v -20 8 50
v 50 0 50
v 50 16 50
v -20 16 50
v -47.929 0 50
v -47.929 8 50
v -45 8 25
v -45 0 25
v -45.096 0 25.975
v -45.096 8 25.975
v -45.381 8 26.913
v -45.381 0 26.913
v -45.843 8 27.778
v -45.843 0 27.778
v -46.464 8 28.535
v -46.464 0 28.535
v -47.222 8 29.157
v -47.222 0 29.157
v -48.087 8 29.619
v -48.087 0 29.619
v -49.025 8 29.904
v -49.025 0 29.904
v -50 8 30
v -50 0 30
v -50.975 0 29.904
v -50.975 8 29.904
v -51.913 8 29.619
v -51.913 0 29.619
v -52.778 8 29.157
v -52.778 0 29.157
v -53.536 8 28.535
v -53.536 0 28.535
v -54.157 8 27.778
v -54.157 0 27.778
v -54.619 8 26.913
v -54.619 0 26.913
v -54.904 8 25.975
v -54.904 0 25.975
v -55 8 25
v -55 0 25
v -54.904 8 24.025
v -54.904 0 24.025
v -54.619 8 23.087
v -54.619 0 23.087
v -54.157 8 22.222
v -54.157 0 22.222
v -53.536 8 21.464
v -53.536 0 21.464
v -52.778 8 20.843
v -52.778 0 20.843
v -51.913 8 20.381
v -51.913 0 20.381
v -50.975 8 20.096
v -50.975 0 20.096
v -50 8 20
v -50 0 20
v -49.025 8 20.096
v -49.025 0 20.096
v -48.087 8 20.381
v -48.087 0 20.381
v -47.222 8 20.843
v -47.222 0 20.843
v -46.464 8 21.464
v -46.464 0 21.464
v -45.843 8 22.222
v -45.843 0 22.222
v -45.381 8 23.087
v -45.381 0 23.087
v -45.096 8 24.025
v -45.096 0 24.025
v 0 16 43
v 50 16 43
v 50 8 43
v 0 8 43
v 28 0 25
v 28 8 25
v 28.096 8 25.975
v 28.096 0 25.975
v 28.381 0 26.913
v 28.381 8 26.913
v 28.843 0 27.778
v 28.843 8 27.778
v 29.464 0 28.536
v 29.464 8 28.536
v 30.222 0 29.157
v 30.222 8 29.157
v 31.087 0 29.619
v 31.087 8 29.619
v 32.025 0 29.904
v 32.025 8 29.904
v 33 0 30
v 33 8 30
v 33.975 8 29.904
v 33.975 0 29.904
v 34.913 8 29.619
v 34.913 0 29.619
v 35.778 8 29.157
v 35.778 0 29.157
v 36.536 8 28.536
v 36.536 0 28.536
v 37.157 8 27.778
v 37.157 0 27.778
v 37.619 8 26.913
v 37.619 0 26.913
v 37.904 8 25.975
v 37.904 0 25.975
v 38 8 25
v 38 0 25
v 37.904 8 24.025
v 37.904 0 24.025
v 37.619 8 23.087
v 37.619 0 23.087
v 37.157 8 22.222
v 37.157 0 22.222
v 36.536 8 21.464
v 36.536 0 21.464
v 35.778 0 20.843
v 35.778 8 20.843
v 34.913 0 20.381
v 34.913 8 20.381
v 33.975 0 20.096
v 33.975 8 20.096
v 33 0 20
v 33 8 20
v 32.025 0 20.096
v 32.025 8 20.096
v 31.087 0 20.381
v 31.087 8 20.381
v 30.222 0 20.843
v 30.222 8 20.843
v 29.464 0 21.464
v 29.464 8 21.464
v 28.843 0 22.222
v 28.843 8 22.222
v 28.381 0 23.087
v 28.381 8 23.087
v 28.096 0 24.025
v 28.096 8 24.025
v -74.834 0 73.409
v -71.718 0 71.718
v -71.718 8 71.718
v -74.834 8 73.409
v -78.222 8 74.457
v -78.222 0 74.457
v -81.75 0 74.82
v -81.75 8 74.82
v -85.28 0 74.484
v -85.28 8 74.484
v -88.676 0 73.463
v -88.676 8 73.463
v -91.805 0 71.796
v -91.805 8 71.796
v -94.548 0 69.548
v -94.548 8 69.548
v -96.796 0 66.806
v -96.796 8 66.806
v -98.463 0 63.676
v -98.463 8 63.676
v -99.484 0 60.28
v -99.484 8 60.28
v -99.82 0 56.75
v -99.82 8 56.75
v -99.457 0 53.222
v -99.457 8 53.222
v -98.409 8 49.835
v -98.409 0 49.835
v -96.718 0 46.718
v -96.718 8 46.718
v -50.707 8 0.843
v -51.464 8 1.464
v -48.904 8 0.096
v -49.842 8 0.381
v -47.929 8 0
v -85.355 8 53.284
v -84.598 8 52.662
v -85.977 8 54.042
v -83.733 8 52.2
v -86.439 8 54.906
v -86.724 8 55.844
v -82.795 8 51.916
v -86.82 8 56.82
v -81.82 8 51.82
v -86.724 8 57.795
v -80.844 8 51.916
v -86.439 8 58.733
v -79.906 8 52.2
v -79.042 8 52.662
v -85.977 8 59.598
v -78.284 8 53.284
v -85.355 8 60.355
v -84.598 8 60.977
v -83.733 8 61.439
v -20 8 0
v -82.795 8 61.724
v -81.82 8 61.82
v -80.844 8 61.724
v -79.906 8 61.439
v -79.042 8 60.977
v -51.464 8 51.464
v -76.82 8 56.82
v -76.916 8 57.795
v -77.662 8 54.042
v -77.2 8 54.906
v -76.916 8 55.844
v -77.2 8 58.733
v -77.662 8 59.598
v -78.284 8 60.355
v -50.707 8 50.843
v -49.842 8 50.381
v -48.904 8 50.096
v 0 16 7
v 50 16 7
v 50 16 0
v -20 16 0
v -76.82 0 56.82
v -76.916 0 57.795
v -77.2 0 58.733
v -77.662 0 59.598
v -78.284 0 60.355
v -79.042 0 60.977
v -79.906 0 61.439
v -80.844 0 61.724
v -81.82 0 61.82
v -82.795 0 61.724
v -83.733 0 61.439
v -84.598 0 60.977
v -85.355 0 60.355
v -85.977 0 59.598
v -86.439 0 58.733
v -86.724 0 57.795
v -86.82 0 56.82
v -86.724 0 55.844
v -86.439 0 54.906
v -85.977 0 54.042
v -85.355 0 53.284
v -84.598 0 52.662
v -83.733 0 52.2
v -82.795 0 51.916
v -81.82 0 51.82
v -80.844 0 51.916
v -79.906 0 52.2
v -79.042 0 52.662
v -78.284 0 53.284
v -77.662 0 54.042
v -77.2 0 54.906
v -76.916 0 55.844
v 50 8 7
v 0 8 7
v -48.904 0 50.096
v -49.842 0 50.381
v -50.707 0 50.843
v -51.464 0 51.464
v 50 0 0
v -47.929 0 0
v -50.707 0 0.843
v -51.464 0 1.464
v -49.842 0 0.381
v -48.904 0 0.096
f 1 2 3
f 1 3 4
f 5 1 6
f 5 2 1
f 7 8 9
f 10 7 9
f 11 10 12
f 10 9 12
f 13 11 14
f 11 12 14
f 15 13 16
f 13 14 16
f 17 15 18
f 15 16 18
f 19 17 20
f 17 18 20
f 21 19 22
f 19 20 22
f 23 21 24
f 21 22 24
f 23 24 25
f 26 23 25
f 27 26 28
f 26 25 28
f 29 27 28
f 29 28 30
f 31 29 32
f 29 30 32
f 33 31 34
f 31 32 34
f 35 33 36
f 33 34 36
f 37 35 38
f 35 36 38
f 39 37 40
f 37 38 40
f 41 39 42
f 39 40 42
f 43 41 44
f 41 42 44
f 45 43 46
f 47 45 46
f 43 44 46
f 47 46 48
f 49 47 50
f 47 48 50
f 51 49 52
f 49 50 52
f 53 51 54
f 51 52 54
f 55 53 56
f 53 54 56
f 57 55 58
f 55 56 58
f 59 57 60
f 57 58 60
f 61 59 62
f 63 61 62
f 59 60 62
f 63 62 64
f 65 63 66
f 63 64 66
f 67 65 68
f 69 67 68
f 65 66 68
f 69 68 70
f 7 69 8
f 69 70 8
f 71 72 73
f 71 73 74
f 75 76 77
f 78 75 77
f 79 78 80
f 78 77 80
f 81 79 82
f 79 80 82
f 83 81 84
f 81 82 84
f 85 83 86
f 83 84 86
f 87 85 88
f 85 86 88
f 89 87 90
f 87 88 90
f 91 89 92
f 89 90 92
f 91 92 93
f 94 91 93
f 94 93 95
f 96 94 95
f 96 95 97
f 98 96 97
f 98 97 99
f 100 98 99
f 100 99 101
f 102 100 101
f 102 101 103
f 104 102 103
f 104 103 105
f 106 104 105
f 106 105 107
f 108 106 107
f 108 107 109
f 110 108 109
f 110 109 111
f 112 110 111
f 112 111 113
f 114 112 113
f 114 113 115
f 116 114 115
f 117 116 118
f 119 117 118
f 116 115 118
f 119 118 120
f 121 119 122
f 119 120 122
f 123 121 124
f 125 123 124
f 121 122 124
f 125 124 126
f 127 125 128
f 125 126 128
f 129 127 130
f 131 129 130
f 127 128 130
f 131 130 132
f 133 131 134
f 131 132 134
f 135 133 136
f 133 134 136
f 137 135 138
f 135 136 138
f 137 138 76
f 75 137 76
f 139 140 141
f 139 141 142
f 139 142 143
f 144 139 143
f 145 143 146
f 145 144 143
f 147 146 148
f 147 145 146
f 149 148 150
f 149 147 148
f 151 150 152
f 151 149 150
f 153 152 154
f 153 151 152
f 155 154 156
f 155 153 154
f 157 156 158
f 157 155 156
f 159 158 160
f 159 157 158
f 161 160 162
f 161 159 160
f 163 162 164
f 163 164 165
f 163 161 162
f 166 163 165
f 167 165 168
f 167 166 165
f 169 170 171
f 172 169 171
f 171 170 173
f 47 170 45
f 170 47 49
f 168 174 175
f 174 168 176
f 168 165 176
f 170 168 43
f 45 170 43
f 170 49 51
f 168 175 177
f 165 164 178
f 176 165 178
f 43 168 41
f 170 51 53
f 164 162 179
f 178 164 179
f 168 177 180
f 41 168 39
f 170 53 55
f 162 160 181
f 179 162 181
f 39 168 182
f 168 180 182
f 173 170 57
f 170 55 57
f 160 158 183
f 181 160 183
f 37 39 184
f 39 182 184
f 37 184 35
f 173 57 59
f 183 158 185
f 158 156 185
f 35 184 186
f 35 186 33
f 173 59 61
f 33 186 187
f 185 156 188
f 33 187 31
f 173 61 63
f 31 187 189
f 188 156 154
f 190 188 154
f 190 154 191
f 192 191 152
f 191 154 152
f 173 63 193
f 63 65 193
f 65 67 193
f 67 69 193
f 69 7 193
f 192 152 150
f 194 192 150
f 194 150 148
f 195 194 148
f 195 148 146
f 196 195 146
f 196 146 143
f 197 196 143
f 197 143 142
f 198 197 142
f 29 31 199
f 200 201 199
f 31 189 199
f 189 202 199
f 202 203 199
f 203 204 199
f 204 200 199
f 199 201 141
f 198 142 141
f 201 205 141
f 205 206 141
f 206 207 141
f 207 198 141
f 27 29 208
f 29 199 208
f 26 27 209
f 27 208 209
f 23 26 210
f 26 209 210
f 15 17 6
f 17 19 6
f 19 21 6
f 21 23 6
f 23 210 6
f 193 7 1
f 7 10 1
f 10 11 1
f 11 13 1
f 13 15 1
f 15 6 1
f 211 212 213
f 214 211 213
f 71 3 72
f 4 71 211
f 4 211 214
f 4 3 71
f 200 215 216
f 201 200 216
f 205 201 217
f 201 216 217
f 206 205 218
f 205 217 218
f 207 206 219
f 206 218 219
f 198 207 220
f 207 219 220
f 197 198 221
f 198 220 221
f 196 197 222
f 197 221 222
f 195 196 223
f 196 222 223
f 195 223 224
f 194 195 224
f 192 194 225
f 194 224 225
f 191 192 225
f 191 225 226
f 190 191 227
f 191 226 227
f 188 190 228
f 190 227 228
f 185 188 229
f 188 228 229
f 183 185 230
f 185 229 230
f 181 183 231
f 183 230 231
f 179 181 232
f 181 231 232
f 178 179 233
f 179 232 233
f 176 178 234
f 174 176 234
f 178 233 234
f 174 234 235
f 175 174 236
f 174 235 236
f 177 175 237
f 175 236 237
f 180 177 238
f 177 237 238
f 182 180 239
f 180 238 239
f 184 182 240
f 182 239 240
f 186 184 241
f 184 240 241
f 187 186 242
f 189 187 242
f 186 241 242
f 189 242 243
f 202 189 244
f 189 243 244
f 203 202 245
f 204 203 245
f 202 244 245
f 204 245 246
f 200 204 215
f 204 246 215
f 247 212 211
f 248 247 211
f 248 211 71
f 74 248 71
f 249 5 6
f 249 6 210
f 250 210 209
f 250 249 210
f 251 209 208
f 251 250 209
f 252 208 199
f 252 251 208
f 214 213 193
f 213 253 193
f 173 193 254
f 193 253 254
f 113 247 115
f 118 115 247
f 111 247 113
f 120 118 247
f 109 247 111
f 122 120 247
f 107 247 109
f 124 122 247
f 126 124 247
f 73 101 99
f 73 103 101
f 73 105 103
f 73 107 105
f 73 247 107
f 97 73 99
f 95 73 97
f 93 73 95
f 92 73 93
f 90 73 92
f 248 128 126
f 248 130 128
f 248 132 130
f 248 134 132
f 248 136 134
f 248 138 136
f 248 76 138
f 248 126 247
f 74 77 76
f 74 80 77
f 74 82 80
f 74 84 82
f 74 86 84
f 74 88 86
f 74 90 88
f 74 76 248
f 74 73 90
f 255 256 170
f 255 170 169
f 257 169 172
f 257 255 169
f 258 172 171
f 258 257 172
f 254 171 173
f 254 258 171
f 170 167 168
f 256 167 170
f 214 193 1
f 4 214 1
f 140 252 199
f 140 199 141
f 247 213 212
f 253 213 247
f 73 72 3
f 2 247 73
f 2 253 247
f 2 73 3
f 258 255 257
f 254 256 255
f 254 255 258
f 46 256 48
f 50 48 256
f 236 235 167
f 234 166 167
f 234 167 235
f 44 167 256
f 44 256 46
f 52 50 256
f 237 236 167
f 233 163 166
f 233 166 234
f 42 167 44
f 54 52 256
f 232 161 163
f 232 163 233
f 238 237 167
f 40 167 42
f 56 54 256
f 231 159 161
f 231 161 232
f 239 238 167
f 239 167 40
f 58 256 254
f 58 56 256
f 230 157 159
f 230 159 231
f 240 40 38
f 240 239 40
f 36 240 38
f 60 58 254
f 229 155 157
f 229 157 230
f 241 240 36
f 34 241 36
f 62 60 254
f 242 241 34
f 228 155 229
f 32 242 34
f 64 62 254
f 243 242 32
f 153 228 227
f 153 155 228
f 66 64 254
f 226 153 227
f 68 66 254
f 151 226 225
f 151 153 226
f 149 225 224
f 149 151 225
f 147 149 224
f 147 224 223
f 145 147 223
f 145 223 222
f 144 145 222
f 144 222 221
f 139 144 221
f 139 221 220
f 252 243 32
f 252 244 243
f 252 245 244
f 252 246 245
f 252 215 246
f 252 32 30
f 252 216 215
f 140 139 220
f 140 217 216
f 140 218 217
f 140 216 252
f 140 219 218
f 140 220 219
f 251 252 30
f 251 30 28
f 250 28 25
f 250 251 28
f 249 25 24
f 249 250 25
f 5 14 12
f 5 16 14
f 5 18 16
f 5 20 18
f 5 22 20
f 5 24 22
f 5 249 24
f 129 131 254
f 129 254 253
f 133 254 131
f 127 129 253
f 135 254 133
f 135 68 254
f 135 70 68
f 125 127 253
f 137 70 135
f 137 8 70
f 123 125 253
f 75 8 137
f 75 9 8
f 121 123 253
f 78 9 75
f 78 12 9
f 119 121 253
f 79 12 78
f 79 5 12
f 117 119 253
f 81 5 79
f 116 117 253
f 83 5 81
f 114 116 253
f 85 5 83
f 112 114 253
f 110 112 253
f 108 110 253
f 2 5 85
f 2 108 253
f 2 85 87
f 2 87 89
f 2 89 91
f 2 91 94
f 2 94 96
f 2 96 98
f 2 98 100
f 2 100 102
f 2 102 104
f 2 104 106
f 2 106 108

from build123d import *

# Parameters (mm, degrees)
F0_R     = 5
F1_DEPTH = 8
F2_W     = 70
F2_H     = 50
F3_DEPTH = 8
F4_W     = 50
F4_H     = 36
F5_DEPTH = 8
F6_R     = 5
F7_DEPTH = 25


with BuildPart() as f1:
    # F0 (on Front) → F1 (new body)
    with BuildSketch(Plane.XZ):
        with BuildLine():
            ThreePointArc((-51.464466, 1.464466), (-49.842349, 0.380602), (-47.928932, 0))
            Line((-47.928932, 0), (50, 0))
            Line((50, 0), (50, 50))
            Line((50, 50), (-47.928932, 50))
            ThreePointArc((-47.928932, 50), (-49.842349, 50.380602), (-51.464466, 51.464466))
            Line((-51.464466, 51.464466), (-71.717587, 71.717587))
            ThreePointArc((-71.717587, 71.717587), (-94.547613, 69.547798), (-96.717812, 46.717812))
            Line((-96.717812, 46.717812), (-51.464466, 1.464466))
        make_face()
        with Locations((-50, 24.999957)):
            Circle(F0_R, mode=Mode.SUBTRACT)
        with Locations((-81.819805, 56.819762)):
            Circle(F0_R, mode=Mode.SUBTRACT)
    extrude(amount=-F1_DEPTH)

    # F2 (on face) → F3 (join)
    with BuildSketch(Plane(origin=(0, 8, 0), x_dir=(-1, 0, 0), z_dir=(0, 1, 0))):
        with Locations((-15, 25)):
            Rectangle(F2_W, F2_H)
    extrude(amount=F3_DEPTH)

    # F4 (on face) → F5 (cut)
    with BuildSketch(Plane(origin=(0, 16, 0), x_dir=(-1, 0, 0), z_dir=(0, 1, 0))):
        with Locations((-25, 25)):
            Rectangle(F4_W, F4_H)
    extrude(amount=-F5_DEPTH, mode=Mode.SUBTRACT)

    # F6 (on face) → F7 (cut)
    with BuildSketch(Plane(origin=(0, 8, 0), x_dir=(-1, 0, 0), z_dir=(0, 1, 0))):
        with Locations((-33, 25)):
            Circle(F6_R)
    extrude(amount=-F7_DEPTH, mode=Mode.SUBTRACT)


solid = f1.part
